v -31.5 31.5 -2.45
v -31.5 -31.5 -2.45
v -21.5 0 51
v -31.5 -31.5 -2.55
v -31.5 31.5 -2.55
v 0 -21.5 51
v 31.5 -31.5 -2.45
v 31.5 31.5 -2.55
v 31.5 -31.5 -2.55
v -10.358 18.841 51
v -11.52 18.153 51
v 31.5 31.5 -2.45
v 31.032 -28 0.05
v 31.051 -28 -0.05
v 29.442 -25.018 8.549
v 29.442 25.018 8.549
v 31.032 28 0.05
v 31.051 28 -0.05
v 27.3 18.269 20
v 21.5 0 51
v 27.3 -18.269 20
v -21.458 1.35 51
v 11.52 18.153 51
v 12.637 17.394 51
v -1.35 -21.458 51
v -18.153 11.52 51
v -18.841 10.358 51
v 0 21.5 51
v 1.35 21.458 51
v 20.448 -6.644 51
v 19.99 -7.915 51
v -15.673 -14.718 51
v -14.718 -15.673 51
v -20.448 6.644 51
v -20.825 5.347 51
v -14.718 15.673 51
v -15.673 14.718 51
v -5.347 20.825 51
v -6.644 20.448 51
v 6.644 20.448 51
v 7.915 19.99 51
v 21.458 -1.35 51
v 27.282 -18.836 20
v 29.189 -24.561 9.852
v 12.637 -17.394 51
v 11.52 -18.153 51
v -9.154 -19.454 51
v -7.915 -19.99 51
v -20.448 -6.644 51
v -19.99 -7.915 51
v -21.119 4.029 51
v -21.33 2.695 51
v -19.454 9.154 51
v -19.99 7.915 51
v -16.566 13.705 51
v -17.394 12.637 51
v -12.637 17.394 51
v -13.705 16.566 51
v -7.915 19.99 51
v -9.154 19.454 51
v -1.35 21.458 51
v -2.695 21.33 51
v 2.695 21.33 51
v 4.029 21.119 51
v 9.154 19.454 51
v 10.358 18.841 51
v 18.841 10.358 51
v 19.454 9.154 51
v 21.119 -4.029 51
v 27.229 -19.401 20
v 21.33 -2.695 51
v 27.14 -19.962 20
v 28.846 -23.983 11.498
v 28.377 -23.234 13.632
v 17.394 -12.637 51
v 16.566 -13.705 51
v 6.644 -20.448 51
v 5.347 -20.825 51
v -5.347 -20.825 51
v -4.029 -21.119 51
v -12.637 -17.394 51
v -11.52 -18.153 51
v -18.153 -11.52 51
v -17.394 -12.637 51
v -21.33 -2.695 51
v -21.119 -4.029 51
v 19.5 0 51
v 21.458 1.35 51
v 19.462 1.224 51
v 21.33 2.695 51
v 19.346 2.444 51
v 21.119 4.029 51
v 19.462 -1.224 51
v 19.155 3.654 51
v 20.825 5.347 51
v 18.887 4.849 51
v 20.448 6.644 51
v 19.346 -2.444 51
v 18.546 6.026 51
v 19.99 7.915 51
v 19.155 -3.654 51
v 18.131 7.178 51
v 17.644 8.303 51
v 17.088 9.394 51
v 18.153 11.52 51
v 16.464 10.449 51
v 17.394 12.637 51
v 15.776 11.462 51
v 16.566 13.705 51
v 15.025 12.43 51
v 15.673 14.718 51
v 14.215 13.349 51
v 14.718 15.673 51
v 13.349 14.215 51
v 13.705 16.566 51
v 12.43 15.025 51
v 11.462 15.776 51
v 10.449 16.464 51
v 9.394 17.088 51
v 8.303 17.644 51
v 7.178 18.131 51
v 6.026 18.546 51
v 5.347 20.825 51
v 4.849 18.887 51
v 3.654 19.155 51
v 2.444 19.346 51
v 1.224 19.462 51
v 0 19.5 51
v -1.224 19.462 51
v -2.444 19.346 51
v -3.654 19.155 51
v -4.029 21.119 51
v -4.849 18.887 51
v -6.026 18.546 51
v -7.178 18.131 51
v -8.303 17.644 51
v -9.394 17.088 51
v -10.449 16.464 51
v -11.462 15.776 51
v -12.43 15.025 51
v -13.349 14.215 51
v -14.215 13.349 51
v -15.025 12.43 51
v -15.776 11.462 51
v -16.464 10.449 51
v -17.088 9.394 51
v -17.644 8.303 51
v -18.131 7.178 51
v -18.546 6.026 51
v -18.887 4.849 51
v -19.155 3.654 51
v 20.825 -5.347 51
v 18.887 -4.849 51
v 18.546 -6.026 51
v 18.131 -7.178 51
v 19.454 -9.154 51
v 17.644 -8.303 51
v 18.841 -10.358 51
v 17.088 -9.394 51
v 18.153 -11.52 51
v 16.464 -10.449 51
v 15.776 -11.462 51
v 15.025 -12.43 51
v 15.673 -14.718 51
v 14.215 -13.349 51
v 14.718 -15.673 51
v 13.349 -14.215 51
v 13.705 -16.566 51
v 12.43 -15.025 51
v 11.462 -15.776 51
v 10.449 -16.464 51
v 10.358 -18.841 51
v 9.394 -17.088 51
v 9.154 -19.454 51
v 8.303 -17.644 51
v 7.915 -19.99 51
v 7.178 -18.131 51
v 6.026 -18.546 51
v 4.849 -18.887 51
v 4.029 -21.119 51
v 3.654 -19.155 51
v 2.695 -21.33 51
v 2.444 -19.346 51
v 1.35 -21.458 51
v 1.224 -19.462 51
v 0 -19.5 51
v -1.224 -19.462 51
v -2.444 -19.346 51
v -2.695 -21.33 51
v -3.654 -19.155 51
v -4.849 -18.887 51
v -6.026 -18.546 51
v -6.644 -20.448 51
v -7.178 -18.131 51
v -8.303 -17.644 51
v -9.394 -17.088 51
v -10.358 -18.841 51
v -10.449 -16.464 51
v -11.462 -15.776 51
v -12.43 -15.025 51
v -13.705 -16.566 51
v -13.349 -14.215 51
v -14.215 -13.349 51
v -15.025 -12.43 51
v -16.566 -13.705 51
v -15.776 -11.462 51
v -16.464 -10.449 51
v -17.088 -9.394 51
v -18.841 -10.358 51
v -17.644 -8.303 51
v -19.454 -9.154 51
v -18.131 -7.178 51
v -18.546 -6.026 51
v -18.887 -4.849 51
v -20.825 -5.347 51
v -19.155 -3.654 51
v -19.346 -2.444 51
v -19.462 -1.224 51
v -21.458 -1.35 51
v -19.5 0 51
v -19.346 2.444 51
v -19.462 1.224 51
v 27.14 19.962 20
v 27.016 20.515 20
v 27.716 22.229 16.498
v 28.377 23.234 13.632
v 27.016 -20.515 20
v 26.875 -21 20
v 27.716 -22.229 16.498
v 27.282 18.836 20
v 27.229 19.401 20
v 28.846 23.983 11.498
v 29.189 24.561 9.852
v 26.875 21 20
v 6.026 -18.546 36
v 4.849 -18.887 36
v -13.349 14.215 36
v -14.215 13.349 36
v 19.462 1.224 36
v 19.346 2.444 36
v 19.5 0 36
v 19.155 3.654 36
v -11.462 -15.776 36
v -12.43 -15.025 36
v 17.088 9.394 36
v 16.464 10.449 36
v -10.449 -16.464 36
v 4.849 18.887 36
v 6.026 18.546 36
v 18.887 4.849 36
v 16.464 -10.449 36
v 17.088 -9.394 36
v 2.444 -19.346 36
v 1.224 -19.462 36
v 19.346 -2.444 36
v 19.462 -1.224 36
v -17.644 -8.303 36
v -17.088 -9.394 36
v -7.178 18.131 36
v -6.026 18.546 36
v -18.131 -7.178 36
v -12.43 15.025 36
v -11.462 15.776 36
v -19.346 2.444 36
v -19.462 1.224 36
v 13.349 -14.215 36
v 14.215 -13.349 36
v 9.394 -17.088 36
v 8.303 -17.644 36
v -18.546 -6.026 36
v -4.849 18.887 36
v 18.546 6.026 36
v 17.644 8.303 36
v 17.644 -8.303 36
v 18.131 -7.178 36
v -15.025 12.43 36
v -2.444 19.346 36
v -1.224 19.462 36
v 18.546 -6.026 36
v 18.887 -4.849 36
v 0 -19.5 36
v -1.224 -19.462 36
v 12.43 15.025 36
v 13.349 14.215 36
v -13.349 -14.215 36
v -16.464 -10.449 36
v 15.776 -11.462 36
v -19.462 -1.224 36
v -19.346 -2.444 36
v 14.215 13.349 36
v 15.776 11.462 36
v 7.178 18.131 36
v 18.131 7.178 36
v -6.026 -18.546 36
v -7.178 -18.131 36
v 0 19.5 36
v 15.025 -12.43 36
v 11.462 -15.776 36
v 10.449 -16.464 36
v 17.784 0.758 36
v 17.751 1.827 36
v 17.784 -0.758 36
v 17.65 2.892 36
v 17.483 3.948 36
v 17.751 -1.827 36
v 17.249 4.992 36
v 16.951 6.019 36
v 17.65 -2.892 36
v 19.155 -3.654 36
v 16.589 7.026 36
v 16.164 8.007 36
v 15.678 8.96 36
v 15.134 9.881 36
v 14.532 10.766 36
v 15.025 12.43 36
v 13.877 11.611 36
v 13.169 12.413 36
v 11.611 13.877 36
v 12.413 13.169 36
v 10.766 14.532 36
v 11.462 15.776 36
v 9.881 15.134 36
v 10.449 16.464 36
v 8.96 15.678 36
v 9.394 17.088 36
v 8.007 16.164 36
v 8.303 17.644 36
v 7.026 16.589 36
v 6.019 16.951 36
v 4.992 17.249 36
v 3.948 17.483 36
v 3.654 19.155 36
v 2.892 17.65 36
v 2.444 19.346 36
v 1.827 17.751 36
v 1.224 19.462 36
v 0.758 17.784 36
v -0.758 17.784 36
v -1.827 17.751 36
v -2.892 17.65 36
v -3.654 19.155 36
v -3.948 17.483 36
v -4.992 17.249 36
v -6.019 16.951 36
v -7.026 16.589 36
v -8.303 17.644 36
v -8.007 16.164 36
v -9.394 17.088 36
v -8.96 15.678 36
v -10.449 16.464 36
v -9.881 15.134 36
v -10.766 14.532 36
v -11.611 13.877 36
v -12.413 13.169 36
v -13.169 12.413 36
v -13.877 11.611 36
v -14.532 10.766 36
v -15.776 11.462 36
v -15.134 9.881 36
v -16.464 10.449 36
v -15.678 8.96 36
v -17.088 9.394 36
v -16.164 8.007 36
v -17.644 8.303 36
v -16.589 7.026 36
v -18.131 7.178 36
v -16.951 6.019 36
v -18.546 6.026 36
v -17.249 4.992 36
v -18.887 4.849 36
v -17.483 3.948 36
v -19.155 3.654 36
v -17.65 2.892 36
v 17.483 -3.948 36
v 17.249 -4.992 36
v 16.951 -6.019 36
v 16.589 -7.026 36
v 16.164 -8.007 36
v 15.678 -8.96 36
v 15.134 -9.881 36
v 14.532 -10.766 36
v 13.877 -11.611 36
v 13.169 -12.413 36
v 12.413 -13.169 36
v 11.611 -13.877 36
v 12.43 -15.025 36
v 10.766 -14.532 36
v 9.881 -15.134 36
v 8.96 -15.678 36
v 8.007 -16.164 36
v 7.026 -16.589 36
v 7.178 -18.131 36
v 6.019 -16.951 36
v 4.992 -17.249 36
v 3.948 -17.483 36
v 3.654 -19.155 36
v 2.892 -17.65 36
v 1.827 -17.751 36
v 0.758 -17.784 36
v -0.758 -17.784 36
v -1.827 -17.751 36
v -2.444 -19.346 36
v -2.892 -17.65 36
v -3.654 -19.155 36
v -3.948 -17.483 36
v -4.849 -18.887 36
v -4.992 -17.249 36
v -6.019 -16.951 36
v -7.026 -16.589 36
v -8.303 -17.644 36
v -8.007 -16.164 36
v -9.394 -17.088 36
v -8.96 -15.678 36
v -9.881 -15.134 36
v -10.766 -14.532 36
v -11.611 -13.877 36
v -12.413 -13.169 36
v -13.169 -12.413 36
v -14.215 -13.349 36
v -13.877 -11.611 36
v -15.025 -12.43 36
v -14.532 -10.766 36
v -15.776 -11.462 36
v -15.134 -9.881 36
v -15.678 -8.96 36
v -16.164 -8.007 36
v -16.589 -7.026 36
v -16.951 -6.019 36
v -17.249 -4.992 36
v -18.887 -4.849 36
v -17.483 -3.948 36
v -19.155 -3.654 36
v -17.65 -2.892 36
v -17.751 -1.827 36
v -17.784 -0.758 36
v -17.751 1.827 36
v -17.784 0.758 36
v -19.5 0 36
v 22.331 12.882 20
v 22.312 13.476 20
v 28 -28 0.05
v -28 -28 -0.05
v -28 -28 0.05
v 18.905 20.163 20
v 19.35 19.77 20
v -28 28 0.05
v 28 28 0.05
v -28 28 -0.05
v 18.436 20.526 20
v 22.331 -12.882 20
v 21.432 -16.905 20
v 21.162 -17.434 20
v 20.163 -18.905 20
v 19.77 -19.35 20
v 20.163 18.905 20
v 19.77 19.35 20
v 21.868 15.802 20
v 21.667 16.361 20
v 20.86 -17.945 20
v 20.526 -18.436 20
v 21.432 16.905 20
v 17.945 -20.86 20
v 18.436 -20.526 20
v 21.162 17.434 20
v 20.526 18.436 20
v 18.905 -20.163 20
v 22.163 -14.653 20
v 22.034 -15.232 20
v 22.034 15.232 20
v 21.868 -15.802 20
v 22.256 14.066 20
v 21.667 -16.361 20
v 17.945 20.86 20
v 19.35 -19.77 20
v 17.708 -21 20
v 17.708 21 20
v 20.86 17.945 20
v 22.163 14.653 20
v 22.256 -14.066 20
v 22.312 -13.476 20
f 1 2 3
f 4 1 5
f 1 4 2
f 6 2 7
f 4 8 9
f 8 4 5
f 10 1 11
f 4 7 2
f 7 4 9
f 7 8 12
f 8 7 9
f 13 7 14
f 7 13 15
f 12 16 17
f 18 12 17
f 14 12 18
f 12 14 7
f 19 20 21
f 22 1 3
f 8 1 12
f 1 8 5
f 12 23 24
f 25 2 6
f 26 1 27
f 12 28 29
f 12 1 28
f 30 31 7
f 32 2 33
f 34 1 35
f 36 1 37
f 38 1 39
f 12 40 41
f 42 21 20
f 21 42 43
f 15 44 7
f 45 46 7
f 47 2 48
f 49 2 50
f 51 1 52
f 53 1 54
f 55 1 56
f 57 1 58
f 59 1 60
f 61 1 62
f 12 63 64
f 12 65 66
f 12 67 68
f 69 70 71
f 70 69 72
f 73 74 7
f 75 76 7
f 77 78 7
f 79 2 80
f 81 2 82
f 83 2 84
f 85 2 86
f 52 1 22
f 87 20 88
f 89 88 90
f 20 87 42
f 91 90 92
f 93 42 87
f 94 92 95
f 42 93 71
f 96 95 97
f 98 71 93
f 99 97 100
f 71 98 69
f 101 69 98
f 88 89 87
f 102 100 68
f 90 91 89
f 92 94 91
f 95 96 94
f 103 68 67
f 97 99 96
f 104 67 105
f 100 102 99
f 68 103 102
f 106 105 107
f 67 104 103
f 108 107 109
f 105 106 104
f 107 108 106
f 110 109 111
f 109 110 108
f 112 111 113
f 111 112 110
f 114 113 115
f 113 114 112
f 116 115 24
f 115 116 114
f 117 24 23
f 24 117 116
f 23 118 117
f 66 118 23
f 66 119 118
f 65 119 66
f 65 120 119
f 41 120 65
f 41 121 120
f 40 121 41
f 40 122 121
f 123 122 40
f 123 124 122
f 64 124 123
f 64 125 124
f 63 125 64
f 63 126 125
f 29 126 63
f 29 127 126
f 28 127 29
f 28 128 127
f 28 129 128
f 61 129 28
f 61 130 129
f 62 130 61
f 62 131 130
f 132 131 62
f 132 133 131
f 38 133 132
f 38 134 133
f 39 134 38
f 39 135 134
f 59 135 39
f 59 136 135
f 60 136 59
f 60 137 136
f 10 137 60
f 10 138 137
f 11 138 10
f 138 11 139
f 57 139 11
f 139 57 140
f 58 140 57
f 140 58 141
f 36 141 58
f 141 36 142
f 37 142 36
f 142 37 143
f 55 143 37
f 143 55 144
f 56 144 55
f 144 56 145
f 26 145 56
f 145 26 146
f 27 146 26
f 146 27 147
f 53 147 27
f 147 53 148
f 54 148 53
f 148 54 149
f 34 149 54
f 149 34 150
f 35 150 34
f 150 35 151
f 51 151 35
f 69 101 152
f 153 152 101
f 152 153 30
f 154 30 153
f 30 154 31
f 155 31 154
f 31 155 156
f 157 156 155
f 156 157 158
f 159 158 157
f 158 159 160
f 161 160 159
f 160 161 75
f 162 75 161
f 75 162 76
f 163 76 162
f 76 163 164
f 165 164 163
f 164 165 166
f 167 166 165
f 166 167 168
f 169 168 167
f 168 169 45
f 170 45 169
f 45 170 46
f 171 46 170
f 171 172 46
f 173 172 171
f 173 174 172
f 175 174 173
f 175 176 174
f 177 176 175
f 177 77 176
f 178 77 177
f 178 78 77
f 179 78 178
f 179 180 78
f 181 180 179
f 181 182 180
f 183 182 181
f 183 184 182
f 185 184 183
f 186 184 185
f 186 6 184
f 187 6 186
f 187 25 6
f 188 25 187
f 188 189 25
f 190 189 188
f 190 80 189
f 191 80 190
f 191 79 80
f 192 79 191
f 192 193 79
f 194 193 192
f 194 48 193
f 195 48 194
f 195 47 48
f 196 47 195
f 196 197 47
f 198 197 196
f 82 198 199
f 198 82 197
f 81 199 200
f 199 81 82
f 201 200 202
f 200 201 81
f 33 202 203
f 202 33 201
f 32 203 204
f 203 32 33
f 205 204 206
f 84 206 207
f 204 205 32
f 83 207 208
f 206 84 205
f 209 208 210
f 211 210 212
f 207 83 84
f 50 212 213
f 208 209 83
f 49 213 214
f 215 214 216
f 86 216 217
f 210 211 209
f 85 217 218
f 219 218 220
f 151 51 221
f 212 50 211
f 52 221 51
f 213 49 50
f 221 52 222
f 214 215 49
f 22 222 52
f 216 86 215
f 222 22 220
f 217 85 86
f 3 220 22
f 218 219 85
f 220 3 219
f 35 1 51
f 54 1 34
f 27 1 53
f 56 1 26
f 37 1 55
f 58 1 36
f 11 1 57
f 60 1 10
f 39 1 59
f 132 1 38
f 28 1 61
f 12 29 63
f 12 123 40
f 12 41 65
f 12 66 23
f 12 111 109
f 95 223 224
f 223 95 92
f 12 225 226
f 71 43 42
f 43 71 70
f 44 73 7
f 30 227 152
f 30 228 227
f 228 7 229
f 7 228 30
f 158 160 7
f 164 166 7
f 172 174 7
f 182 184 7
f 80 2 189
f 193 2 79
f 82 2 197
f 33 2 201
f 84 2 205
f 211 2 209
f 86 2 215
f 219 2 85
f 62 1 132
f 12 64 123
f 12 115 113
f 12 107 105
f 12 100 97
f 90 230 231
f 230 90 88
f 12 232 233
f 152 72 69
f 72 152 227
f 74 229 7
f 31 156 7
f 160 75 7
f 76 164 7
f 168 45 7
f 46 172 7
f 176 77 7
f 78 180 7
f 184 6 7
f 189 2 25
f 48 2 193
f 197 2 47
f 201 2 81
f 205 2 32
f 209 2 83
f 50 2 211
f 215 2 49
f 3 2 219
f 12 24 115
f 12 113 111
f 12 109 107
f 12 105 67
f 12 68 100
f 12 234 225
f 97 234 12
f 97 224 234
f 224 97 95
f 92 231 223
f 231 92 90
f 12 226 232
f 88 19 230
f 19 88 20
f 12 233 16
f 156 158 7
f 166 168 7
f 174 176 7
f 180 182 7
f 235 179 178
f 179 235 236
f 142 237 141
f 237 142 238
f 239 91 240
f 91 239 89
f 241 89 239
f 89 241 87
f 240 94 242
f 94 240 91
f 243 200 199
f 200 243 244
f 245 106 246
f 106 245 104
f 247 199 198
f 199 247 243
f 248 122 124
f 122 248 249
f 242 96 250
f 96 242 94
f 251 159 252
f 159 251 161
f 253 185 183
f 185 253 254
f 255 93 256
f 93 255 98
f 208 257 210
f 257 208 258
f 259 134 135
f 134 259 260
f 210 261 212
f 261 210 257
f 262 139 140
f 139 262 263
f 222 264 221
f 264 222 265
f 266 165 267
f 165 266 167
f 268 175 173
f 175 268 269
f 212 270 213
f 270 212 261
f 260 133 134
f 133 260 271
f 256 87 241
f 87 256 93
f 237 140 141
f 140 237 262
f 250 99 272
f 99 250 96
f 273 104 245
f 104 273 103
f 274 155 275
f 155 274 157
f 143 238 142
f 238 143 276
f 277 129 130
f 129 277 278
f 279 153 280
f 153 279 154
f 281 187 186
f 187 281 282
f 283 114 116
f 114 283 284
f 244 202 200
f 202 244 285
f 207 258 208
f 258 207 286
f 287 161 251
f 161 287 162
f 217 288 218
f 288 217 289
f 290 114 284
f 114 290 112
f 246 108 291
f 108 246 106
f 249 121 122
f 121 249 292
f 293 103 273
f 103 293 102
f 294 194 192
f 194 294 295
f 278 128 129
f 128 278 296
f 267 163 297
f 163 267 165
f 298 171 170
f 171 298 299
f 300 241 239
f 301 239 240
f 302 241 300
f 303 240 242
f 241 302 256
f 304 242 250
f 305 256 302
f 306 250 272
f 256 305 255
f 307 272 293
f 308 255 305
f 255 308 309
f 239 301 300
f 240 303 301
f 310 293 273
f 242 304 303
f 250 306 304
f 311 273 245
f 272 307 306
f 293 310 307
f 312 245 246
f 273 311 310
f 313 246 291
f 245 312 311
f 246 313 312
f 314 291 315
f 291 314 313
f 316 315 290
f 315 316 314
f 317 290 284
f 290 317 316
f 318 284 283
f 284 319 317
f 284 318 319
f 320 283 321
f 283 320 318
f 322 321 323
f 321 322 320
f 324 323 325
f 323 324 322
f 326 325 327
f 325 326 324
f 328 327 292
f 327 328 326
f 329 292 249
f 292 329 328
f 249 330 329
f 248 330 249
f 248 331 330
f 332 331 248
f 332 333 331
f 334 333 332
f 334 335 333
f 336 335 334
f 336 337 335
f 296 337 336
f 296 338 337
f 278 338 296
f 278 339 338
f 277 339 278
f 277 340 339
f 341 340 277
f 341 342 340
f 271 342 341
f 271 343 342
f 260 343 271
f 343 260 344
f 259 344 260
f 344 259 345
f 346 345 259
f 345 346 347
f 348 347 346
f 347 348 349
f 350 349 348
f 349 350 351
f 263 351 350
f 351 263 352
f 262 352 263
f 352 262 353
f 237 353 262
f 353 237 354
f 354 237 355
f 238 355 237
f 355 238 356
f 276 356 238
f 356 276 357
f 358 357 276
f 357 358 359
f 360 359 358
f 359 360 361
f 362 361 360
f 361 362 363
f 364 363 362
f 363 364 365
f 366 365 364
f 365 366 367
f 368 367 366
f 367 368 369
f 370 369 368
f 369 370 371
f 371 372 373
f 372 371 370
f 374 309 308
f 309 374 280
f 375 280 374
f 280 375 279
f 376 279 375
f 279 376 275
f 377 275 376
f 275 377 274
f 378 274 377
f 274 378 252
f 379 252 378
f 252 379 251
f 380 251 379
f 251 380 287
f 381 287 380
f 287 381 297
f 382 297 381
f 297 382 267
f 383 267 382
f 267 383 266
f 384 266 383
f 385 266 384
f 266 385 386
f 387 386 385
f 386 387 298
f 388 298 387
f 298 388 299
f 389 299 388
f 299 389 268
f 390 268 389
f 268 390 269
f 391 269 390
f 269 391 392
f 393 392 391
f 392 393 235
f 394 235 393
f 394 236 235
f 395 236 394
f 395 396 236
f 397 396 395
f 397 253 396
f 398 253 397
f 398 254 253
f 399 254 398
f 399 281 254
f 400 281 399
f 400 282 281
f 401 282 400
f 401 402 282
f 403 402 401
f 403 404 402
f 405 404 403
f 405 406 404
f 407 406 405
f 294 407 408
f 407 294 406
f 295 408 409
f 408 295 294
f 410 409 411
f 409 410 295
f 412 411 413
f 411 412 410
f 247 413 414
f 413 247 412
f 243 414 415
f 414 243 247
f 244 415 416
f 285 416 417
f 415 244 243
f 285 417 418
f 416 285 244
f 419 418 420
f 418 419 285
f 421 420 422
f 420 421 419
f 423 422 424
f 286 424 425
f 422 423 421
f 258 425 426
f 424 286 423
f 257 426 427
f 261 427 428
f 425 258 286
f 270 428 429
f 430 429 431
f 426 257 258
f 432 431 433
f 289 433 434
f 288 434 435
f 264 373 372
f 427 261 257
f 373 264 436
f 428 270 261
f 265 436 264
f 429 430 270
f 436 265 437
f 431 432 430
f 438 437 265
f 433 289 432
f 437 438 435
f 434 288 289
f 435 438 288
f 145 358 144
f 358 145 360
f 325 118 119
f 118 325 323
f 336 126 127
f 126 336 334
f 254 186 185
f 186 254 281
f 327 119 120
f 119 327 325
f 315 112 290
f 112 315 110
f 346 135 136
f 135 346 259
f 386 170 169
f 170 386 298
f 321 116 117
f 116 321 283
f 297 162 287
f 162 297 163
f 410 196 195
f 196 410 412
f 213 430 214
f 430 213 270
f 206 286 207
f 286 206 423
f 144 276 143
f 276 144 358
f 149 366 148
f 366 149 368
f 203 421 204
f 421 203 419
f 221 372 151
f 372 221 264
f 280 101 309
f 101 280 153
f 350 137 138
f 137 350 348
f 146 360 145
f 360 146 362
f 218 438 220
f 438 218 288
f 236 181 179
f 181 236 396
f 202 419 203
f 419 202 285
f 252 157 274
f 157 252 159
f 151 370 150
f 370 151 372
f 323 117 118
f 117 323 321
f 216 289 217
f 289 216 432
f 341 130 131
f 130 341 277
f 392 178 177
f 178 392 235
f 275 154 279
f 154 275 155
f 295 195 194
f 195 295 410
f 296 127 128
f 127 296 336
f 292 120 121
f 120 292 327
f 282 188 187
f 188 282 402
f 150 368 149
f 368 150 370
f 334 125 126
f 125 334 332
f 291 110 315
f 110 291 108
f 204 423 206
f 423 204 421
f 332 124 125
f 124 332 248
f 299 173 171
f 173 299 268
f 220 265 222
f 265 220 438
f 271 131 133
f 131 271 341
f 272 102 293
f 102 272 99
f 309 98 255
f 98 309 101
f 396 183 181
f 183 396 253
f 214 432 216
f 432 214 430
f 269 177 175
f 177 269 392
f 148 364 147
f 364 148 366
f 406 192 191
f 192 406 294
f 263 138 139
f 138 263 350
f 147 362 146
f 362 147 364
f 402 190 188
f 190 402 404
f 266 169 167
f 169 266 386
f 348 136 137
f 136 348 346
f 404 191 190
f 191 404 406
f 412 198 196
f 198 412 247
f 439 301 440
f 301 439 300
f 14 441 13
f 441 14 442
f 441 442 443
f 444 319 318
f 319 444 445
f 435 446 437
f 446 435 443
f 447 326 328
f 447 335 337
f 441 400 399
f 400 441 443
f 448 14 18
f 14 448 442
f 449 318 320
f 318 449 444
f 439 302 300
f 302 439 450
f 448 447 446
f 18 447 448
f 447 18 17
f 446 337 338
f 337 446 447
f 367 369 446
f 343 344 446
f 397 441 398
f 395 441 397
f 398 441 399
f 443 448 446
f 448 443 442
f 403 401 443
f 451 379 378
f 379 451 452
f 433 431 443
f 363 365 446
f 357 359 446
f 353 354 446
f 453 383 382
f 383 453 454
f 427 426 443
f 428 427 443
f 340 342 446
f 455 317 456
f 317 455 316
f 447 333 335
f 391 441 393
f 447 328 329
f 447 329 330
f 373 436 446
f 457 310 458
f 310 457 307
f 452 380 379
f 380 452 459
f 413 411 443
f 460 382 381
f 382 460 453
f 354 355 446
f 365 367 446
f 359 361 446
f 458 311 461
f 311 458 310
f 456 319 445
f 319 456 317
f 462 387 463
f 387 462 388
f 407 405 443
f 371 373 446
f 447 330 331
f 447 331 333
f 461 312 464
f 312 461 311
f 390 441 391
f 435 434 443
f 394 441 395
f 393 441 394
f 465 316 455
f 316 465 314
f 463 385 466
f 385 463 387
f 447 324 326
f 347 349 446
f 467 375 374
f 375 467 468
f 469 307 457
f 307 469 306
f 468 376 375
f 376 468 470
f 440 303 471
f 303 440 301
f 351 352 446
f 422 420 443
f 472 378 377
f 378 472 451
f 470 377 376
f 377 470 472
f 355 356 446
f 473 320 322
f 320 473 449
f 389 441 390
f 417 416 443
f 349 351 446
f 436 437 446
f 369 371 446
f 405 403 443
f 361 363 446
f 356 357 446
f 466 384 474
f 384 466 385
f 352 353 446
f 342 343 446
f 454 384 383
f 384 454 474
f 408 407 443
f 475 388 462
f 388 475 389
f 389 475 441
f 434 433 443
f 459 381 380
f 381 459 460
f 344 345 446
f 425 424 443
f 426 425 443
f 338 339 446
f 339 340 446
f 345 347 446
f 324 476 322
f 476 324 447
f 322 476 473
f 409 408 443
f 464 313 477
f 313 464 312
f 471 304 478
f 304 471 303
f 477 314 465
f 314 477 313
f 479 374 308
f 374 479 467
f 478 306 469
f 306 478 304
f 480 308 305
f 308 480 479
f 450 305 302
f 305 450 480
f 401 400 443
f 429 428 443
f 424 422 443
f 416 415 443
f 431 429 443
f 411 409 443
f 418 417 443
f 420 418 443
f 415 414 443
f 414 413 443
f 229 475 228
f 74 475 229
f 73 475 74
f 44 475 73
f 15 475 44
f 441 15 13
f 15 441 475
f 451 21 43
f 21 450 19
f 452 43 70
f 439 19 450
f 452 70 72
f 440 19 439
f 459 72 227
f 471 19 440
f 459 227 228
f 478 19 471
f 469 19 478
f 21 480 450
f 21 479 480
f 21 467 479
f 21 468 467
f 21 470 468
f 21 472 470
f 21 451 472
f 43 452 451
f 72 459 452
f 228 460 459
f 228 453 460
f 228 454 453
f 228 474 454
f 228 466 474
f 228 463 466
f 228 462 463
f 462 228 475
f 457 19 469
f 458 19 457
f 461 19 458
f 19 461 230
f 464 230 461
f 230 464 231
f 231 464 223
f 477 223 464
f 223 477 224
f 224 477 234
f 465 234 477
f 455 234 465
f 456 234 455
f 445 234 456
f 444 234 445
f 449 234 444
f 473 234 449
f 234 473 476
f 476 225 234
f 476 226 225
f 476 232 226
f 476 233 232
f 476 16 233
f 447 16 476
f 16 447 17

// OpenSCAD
ld = 39;
lh = 15;
fd = 36;

$fn = 100;

difference() {
    hull() {
        translate([0,0,fd]) cylinder(d=ld+4,h=lh);
        translate([0,0,-2.5]) cube([63,63,0.1], center=true);
    }
    translate([0,0,fd]) cylinder(d=ld,h=lh+1);
    hull() {
        translate([0,0,fd]) cylinder(d=ld-4,h=1);
        translate([0,0,0]) cube([56,56,0.1], center=true);
    }
    hull() {
        translate([50,0,0]) cube([100,56,0.1], center=true);
        translate([50,0,10]) cube([100,42,20], center=true);
    }
}
